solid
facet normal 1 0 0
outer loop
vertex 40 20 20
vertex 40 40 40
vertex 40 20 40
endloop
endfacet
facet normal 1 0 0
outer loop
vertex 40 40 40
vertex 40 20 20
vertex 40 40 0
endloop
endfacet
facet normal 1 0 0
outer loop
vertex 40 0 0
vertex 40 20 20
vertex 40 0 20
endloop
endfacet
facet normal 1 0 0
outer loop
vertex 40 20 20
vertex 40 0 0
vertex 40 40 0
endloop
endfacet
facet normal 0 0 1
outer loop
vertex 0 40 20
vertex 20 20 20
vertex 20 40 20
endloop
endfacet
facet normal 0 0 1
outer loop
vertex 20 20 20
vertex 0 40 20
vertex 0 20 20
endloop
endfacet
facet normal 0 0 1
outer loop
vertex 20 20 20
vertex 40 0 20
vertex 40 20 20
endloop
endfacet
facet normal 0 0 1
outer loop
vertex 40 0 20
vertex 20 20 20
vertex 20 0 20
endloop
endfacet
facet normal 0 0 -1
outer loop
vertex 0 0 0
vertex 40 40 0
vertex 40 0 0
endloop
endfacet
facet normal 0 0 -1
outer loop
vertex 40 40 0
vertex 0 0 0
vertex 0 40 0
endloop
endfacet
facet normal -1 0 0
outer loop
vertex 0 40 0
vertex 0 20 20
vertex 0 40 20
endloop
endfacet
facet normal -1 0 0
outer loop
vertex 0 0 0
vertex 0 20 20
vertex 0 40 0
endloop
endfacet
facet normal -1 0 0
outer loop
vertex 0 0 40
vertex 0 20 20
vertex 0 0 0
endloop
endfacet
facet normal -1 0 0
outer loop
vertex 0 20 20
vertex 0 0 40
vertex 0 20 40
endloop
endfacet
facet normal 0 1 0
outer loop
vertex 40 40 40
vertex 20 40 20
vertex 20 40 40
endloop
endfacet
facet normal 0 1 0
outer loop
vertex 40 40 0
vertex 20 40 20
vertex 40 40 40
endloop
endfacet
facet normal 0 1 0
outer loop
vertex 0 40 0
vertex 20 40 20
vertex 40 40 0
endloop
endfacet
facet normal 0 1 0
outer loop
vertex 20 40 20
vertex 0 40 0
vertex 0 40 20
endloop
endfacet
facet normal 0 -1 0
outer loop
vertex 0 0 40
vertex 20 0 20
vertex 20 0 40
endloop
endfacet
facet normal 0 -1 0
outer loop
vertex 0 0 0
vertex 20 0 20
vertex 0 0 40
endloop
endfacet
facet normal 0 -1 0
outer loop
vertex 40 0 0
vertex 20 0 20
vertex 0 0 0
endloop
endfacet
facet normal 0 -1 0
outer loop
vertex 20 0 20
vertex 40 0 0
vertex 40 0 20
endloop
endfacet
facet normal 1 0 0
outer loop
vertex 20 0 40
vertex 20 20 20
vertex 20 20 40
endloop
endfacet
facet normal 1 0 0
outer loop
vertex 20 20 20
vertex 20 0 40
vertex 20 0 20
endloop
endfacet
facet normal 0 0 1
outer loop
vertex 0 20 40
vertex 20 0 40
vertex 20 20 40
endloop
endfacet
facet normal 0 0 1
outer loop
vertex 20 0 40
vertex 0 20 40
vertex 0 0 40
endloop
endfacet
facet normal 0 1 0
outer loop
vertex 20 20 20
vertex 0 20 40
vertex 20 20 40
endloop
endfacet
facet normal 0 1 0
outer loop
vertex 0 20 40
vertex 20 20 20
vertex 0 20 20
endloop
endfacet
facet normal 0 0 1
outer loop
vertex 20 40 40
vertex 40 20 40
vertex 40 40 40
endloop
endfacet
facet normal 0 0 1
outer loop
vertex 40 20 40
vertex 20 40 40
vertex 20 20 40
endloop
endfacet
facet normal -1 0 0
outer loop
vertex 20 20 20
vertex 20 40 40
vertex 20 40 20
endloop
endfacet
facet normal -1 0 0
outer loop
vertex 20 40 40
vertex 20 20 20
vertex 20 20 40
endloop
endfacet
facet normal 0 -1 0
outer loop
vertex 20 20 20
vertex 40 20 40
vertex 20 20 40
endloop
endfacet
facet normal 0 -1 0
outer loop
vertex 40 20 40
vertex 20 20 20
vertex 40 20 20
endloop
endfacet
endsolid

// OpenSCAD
union(){
  cube([40, 40, 20], center=false);
  cube([20, 20, 40], center=false);
  translate([20, 20, 0]){
    cube([20, 20, 40], center=false);
  }
}
